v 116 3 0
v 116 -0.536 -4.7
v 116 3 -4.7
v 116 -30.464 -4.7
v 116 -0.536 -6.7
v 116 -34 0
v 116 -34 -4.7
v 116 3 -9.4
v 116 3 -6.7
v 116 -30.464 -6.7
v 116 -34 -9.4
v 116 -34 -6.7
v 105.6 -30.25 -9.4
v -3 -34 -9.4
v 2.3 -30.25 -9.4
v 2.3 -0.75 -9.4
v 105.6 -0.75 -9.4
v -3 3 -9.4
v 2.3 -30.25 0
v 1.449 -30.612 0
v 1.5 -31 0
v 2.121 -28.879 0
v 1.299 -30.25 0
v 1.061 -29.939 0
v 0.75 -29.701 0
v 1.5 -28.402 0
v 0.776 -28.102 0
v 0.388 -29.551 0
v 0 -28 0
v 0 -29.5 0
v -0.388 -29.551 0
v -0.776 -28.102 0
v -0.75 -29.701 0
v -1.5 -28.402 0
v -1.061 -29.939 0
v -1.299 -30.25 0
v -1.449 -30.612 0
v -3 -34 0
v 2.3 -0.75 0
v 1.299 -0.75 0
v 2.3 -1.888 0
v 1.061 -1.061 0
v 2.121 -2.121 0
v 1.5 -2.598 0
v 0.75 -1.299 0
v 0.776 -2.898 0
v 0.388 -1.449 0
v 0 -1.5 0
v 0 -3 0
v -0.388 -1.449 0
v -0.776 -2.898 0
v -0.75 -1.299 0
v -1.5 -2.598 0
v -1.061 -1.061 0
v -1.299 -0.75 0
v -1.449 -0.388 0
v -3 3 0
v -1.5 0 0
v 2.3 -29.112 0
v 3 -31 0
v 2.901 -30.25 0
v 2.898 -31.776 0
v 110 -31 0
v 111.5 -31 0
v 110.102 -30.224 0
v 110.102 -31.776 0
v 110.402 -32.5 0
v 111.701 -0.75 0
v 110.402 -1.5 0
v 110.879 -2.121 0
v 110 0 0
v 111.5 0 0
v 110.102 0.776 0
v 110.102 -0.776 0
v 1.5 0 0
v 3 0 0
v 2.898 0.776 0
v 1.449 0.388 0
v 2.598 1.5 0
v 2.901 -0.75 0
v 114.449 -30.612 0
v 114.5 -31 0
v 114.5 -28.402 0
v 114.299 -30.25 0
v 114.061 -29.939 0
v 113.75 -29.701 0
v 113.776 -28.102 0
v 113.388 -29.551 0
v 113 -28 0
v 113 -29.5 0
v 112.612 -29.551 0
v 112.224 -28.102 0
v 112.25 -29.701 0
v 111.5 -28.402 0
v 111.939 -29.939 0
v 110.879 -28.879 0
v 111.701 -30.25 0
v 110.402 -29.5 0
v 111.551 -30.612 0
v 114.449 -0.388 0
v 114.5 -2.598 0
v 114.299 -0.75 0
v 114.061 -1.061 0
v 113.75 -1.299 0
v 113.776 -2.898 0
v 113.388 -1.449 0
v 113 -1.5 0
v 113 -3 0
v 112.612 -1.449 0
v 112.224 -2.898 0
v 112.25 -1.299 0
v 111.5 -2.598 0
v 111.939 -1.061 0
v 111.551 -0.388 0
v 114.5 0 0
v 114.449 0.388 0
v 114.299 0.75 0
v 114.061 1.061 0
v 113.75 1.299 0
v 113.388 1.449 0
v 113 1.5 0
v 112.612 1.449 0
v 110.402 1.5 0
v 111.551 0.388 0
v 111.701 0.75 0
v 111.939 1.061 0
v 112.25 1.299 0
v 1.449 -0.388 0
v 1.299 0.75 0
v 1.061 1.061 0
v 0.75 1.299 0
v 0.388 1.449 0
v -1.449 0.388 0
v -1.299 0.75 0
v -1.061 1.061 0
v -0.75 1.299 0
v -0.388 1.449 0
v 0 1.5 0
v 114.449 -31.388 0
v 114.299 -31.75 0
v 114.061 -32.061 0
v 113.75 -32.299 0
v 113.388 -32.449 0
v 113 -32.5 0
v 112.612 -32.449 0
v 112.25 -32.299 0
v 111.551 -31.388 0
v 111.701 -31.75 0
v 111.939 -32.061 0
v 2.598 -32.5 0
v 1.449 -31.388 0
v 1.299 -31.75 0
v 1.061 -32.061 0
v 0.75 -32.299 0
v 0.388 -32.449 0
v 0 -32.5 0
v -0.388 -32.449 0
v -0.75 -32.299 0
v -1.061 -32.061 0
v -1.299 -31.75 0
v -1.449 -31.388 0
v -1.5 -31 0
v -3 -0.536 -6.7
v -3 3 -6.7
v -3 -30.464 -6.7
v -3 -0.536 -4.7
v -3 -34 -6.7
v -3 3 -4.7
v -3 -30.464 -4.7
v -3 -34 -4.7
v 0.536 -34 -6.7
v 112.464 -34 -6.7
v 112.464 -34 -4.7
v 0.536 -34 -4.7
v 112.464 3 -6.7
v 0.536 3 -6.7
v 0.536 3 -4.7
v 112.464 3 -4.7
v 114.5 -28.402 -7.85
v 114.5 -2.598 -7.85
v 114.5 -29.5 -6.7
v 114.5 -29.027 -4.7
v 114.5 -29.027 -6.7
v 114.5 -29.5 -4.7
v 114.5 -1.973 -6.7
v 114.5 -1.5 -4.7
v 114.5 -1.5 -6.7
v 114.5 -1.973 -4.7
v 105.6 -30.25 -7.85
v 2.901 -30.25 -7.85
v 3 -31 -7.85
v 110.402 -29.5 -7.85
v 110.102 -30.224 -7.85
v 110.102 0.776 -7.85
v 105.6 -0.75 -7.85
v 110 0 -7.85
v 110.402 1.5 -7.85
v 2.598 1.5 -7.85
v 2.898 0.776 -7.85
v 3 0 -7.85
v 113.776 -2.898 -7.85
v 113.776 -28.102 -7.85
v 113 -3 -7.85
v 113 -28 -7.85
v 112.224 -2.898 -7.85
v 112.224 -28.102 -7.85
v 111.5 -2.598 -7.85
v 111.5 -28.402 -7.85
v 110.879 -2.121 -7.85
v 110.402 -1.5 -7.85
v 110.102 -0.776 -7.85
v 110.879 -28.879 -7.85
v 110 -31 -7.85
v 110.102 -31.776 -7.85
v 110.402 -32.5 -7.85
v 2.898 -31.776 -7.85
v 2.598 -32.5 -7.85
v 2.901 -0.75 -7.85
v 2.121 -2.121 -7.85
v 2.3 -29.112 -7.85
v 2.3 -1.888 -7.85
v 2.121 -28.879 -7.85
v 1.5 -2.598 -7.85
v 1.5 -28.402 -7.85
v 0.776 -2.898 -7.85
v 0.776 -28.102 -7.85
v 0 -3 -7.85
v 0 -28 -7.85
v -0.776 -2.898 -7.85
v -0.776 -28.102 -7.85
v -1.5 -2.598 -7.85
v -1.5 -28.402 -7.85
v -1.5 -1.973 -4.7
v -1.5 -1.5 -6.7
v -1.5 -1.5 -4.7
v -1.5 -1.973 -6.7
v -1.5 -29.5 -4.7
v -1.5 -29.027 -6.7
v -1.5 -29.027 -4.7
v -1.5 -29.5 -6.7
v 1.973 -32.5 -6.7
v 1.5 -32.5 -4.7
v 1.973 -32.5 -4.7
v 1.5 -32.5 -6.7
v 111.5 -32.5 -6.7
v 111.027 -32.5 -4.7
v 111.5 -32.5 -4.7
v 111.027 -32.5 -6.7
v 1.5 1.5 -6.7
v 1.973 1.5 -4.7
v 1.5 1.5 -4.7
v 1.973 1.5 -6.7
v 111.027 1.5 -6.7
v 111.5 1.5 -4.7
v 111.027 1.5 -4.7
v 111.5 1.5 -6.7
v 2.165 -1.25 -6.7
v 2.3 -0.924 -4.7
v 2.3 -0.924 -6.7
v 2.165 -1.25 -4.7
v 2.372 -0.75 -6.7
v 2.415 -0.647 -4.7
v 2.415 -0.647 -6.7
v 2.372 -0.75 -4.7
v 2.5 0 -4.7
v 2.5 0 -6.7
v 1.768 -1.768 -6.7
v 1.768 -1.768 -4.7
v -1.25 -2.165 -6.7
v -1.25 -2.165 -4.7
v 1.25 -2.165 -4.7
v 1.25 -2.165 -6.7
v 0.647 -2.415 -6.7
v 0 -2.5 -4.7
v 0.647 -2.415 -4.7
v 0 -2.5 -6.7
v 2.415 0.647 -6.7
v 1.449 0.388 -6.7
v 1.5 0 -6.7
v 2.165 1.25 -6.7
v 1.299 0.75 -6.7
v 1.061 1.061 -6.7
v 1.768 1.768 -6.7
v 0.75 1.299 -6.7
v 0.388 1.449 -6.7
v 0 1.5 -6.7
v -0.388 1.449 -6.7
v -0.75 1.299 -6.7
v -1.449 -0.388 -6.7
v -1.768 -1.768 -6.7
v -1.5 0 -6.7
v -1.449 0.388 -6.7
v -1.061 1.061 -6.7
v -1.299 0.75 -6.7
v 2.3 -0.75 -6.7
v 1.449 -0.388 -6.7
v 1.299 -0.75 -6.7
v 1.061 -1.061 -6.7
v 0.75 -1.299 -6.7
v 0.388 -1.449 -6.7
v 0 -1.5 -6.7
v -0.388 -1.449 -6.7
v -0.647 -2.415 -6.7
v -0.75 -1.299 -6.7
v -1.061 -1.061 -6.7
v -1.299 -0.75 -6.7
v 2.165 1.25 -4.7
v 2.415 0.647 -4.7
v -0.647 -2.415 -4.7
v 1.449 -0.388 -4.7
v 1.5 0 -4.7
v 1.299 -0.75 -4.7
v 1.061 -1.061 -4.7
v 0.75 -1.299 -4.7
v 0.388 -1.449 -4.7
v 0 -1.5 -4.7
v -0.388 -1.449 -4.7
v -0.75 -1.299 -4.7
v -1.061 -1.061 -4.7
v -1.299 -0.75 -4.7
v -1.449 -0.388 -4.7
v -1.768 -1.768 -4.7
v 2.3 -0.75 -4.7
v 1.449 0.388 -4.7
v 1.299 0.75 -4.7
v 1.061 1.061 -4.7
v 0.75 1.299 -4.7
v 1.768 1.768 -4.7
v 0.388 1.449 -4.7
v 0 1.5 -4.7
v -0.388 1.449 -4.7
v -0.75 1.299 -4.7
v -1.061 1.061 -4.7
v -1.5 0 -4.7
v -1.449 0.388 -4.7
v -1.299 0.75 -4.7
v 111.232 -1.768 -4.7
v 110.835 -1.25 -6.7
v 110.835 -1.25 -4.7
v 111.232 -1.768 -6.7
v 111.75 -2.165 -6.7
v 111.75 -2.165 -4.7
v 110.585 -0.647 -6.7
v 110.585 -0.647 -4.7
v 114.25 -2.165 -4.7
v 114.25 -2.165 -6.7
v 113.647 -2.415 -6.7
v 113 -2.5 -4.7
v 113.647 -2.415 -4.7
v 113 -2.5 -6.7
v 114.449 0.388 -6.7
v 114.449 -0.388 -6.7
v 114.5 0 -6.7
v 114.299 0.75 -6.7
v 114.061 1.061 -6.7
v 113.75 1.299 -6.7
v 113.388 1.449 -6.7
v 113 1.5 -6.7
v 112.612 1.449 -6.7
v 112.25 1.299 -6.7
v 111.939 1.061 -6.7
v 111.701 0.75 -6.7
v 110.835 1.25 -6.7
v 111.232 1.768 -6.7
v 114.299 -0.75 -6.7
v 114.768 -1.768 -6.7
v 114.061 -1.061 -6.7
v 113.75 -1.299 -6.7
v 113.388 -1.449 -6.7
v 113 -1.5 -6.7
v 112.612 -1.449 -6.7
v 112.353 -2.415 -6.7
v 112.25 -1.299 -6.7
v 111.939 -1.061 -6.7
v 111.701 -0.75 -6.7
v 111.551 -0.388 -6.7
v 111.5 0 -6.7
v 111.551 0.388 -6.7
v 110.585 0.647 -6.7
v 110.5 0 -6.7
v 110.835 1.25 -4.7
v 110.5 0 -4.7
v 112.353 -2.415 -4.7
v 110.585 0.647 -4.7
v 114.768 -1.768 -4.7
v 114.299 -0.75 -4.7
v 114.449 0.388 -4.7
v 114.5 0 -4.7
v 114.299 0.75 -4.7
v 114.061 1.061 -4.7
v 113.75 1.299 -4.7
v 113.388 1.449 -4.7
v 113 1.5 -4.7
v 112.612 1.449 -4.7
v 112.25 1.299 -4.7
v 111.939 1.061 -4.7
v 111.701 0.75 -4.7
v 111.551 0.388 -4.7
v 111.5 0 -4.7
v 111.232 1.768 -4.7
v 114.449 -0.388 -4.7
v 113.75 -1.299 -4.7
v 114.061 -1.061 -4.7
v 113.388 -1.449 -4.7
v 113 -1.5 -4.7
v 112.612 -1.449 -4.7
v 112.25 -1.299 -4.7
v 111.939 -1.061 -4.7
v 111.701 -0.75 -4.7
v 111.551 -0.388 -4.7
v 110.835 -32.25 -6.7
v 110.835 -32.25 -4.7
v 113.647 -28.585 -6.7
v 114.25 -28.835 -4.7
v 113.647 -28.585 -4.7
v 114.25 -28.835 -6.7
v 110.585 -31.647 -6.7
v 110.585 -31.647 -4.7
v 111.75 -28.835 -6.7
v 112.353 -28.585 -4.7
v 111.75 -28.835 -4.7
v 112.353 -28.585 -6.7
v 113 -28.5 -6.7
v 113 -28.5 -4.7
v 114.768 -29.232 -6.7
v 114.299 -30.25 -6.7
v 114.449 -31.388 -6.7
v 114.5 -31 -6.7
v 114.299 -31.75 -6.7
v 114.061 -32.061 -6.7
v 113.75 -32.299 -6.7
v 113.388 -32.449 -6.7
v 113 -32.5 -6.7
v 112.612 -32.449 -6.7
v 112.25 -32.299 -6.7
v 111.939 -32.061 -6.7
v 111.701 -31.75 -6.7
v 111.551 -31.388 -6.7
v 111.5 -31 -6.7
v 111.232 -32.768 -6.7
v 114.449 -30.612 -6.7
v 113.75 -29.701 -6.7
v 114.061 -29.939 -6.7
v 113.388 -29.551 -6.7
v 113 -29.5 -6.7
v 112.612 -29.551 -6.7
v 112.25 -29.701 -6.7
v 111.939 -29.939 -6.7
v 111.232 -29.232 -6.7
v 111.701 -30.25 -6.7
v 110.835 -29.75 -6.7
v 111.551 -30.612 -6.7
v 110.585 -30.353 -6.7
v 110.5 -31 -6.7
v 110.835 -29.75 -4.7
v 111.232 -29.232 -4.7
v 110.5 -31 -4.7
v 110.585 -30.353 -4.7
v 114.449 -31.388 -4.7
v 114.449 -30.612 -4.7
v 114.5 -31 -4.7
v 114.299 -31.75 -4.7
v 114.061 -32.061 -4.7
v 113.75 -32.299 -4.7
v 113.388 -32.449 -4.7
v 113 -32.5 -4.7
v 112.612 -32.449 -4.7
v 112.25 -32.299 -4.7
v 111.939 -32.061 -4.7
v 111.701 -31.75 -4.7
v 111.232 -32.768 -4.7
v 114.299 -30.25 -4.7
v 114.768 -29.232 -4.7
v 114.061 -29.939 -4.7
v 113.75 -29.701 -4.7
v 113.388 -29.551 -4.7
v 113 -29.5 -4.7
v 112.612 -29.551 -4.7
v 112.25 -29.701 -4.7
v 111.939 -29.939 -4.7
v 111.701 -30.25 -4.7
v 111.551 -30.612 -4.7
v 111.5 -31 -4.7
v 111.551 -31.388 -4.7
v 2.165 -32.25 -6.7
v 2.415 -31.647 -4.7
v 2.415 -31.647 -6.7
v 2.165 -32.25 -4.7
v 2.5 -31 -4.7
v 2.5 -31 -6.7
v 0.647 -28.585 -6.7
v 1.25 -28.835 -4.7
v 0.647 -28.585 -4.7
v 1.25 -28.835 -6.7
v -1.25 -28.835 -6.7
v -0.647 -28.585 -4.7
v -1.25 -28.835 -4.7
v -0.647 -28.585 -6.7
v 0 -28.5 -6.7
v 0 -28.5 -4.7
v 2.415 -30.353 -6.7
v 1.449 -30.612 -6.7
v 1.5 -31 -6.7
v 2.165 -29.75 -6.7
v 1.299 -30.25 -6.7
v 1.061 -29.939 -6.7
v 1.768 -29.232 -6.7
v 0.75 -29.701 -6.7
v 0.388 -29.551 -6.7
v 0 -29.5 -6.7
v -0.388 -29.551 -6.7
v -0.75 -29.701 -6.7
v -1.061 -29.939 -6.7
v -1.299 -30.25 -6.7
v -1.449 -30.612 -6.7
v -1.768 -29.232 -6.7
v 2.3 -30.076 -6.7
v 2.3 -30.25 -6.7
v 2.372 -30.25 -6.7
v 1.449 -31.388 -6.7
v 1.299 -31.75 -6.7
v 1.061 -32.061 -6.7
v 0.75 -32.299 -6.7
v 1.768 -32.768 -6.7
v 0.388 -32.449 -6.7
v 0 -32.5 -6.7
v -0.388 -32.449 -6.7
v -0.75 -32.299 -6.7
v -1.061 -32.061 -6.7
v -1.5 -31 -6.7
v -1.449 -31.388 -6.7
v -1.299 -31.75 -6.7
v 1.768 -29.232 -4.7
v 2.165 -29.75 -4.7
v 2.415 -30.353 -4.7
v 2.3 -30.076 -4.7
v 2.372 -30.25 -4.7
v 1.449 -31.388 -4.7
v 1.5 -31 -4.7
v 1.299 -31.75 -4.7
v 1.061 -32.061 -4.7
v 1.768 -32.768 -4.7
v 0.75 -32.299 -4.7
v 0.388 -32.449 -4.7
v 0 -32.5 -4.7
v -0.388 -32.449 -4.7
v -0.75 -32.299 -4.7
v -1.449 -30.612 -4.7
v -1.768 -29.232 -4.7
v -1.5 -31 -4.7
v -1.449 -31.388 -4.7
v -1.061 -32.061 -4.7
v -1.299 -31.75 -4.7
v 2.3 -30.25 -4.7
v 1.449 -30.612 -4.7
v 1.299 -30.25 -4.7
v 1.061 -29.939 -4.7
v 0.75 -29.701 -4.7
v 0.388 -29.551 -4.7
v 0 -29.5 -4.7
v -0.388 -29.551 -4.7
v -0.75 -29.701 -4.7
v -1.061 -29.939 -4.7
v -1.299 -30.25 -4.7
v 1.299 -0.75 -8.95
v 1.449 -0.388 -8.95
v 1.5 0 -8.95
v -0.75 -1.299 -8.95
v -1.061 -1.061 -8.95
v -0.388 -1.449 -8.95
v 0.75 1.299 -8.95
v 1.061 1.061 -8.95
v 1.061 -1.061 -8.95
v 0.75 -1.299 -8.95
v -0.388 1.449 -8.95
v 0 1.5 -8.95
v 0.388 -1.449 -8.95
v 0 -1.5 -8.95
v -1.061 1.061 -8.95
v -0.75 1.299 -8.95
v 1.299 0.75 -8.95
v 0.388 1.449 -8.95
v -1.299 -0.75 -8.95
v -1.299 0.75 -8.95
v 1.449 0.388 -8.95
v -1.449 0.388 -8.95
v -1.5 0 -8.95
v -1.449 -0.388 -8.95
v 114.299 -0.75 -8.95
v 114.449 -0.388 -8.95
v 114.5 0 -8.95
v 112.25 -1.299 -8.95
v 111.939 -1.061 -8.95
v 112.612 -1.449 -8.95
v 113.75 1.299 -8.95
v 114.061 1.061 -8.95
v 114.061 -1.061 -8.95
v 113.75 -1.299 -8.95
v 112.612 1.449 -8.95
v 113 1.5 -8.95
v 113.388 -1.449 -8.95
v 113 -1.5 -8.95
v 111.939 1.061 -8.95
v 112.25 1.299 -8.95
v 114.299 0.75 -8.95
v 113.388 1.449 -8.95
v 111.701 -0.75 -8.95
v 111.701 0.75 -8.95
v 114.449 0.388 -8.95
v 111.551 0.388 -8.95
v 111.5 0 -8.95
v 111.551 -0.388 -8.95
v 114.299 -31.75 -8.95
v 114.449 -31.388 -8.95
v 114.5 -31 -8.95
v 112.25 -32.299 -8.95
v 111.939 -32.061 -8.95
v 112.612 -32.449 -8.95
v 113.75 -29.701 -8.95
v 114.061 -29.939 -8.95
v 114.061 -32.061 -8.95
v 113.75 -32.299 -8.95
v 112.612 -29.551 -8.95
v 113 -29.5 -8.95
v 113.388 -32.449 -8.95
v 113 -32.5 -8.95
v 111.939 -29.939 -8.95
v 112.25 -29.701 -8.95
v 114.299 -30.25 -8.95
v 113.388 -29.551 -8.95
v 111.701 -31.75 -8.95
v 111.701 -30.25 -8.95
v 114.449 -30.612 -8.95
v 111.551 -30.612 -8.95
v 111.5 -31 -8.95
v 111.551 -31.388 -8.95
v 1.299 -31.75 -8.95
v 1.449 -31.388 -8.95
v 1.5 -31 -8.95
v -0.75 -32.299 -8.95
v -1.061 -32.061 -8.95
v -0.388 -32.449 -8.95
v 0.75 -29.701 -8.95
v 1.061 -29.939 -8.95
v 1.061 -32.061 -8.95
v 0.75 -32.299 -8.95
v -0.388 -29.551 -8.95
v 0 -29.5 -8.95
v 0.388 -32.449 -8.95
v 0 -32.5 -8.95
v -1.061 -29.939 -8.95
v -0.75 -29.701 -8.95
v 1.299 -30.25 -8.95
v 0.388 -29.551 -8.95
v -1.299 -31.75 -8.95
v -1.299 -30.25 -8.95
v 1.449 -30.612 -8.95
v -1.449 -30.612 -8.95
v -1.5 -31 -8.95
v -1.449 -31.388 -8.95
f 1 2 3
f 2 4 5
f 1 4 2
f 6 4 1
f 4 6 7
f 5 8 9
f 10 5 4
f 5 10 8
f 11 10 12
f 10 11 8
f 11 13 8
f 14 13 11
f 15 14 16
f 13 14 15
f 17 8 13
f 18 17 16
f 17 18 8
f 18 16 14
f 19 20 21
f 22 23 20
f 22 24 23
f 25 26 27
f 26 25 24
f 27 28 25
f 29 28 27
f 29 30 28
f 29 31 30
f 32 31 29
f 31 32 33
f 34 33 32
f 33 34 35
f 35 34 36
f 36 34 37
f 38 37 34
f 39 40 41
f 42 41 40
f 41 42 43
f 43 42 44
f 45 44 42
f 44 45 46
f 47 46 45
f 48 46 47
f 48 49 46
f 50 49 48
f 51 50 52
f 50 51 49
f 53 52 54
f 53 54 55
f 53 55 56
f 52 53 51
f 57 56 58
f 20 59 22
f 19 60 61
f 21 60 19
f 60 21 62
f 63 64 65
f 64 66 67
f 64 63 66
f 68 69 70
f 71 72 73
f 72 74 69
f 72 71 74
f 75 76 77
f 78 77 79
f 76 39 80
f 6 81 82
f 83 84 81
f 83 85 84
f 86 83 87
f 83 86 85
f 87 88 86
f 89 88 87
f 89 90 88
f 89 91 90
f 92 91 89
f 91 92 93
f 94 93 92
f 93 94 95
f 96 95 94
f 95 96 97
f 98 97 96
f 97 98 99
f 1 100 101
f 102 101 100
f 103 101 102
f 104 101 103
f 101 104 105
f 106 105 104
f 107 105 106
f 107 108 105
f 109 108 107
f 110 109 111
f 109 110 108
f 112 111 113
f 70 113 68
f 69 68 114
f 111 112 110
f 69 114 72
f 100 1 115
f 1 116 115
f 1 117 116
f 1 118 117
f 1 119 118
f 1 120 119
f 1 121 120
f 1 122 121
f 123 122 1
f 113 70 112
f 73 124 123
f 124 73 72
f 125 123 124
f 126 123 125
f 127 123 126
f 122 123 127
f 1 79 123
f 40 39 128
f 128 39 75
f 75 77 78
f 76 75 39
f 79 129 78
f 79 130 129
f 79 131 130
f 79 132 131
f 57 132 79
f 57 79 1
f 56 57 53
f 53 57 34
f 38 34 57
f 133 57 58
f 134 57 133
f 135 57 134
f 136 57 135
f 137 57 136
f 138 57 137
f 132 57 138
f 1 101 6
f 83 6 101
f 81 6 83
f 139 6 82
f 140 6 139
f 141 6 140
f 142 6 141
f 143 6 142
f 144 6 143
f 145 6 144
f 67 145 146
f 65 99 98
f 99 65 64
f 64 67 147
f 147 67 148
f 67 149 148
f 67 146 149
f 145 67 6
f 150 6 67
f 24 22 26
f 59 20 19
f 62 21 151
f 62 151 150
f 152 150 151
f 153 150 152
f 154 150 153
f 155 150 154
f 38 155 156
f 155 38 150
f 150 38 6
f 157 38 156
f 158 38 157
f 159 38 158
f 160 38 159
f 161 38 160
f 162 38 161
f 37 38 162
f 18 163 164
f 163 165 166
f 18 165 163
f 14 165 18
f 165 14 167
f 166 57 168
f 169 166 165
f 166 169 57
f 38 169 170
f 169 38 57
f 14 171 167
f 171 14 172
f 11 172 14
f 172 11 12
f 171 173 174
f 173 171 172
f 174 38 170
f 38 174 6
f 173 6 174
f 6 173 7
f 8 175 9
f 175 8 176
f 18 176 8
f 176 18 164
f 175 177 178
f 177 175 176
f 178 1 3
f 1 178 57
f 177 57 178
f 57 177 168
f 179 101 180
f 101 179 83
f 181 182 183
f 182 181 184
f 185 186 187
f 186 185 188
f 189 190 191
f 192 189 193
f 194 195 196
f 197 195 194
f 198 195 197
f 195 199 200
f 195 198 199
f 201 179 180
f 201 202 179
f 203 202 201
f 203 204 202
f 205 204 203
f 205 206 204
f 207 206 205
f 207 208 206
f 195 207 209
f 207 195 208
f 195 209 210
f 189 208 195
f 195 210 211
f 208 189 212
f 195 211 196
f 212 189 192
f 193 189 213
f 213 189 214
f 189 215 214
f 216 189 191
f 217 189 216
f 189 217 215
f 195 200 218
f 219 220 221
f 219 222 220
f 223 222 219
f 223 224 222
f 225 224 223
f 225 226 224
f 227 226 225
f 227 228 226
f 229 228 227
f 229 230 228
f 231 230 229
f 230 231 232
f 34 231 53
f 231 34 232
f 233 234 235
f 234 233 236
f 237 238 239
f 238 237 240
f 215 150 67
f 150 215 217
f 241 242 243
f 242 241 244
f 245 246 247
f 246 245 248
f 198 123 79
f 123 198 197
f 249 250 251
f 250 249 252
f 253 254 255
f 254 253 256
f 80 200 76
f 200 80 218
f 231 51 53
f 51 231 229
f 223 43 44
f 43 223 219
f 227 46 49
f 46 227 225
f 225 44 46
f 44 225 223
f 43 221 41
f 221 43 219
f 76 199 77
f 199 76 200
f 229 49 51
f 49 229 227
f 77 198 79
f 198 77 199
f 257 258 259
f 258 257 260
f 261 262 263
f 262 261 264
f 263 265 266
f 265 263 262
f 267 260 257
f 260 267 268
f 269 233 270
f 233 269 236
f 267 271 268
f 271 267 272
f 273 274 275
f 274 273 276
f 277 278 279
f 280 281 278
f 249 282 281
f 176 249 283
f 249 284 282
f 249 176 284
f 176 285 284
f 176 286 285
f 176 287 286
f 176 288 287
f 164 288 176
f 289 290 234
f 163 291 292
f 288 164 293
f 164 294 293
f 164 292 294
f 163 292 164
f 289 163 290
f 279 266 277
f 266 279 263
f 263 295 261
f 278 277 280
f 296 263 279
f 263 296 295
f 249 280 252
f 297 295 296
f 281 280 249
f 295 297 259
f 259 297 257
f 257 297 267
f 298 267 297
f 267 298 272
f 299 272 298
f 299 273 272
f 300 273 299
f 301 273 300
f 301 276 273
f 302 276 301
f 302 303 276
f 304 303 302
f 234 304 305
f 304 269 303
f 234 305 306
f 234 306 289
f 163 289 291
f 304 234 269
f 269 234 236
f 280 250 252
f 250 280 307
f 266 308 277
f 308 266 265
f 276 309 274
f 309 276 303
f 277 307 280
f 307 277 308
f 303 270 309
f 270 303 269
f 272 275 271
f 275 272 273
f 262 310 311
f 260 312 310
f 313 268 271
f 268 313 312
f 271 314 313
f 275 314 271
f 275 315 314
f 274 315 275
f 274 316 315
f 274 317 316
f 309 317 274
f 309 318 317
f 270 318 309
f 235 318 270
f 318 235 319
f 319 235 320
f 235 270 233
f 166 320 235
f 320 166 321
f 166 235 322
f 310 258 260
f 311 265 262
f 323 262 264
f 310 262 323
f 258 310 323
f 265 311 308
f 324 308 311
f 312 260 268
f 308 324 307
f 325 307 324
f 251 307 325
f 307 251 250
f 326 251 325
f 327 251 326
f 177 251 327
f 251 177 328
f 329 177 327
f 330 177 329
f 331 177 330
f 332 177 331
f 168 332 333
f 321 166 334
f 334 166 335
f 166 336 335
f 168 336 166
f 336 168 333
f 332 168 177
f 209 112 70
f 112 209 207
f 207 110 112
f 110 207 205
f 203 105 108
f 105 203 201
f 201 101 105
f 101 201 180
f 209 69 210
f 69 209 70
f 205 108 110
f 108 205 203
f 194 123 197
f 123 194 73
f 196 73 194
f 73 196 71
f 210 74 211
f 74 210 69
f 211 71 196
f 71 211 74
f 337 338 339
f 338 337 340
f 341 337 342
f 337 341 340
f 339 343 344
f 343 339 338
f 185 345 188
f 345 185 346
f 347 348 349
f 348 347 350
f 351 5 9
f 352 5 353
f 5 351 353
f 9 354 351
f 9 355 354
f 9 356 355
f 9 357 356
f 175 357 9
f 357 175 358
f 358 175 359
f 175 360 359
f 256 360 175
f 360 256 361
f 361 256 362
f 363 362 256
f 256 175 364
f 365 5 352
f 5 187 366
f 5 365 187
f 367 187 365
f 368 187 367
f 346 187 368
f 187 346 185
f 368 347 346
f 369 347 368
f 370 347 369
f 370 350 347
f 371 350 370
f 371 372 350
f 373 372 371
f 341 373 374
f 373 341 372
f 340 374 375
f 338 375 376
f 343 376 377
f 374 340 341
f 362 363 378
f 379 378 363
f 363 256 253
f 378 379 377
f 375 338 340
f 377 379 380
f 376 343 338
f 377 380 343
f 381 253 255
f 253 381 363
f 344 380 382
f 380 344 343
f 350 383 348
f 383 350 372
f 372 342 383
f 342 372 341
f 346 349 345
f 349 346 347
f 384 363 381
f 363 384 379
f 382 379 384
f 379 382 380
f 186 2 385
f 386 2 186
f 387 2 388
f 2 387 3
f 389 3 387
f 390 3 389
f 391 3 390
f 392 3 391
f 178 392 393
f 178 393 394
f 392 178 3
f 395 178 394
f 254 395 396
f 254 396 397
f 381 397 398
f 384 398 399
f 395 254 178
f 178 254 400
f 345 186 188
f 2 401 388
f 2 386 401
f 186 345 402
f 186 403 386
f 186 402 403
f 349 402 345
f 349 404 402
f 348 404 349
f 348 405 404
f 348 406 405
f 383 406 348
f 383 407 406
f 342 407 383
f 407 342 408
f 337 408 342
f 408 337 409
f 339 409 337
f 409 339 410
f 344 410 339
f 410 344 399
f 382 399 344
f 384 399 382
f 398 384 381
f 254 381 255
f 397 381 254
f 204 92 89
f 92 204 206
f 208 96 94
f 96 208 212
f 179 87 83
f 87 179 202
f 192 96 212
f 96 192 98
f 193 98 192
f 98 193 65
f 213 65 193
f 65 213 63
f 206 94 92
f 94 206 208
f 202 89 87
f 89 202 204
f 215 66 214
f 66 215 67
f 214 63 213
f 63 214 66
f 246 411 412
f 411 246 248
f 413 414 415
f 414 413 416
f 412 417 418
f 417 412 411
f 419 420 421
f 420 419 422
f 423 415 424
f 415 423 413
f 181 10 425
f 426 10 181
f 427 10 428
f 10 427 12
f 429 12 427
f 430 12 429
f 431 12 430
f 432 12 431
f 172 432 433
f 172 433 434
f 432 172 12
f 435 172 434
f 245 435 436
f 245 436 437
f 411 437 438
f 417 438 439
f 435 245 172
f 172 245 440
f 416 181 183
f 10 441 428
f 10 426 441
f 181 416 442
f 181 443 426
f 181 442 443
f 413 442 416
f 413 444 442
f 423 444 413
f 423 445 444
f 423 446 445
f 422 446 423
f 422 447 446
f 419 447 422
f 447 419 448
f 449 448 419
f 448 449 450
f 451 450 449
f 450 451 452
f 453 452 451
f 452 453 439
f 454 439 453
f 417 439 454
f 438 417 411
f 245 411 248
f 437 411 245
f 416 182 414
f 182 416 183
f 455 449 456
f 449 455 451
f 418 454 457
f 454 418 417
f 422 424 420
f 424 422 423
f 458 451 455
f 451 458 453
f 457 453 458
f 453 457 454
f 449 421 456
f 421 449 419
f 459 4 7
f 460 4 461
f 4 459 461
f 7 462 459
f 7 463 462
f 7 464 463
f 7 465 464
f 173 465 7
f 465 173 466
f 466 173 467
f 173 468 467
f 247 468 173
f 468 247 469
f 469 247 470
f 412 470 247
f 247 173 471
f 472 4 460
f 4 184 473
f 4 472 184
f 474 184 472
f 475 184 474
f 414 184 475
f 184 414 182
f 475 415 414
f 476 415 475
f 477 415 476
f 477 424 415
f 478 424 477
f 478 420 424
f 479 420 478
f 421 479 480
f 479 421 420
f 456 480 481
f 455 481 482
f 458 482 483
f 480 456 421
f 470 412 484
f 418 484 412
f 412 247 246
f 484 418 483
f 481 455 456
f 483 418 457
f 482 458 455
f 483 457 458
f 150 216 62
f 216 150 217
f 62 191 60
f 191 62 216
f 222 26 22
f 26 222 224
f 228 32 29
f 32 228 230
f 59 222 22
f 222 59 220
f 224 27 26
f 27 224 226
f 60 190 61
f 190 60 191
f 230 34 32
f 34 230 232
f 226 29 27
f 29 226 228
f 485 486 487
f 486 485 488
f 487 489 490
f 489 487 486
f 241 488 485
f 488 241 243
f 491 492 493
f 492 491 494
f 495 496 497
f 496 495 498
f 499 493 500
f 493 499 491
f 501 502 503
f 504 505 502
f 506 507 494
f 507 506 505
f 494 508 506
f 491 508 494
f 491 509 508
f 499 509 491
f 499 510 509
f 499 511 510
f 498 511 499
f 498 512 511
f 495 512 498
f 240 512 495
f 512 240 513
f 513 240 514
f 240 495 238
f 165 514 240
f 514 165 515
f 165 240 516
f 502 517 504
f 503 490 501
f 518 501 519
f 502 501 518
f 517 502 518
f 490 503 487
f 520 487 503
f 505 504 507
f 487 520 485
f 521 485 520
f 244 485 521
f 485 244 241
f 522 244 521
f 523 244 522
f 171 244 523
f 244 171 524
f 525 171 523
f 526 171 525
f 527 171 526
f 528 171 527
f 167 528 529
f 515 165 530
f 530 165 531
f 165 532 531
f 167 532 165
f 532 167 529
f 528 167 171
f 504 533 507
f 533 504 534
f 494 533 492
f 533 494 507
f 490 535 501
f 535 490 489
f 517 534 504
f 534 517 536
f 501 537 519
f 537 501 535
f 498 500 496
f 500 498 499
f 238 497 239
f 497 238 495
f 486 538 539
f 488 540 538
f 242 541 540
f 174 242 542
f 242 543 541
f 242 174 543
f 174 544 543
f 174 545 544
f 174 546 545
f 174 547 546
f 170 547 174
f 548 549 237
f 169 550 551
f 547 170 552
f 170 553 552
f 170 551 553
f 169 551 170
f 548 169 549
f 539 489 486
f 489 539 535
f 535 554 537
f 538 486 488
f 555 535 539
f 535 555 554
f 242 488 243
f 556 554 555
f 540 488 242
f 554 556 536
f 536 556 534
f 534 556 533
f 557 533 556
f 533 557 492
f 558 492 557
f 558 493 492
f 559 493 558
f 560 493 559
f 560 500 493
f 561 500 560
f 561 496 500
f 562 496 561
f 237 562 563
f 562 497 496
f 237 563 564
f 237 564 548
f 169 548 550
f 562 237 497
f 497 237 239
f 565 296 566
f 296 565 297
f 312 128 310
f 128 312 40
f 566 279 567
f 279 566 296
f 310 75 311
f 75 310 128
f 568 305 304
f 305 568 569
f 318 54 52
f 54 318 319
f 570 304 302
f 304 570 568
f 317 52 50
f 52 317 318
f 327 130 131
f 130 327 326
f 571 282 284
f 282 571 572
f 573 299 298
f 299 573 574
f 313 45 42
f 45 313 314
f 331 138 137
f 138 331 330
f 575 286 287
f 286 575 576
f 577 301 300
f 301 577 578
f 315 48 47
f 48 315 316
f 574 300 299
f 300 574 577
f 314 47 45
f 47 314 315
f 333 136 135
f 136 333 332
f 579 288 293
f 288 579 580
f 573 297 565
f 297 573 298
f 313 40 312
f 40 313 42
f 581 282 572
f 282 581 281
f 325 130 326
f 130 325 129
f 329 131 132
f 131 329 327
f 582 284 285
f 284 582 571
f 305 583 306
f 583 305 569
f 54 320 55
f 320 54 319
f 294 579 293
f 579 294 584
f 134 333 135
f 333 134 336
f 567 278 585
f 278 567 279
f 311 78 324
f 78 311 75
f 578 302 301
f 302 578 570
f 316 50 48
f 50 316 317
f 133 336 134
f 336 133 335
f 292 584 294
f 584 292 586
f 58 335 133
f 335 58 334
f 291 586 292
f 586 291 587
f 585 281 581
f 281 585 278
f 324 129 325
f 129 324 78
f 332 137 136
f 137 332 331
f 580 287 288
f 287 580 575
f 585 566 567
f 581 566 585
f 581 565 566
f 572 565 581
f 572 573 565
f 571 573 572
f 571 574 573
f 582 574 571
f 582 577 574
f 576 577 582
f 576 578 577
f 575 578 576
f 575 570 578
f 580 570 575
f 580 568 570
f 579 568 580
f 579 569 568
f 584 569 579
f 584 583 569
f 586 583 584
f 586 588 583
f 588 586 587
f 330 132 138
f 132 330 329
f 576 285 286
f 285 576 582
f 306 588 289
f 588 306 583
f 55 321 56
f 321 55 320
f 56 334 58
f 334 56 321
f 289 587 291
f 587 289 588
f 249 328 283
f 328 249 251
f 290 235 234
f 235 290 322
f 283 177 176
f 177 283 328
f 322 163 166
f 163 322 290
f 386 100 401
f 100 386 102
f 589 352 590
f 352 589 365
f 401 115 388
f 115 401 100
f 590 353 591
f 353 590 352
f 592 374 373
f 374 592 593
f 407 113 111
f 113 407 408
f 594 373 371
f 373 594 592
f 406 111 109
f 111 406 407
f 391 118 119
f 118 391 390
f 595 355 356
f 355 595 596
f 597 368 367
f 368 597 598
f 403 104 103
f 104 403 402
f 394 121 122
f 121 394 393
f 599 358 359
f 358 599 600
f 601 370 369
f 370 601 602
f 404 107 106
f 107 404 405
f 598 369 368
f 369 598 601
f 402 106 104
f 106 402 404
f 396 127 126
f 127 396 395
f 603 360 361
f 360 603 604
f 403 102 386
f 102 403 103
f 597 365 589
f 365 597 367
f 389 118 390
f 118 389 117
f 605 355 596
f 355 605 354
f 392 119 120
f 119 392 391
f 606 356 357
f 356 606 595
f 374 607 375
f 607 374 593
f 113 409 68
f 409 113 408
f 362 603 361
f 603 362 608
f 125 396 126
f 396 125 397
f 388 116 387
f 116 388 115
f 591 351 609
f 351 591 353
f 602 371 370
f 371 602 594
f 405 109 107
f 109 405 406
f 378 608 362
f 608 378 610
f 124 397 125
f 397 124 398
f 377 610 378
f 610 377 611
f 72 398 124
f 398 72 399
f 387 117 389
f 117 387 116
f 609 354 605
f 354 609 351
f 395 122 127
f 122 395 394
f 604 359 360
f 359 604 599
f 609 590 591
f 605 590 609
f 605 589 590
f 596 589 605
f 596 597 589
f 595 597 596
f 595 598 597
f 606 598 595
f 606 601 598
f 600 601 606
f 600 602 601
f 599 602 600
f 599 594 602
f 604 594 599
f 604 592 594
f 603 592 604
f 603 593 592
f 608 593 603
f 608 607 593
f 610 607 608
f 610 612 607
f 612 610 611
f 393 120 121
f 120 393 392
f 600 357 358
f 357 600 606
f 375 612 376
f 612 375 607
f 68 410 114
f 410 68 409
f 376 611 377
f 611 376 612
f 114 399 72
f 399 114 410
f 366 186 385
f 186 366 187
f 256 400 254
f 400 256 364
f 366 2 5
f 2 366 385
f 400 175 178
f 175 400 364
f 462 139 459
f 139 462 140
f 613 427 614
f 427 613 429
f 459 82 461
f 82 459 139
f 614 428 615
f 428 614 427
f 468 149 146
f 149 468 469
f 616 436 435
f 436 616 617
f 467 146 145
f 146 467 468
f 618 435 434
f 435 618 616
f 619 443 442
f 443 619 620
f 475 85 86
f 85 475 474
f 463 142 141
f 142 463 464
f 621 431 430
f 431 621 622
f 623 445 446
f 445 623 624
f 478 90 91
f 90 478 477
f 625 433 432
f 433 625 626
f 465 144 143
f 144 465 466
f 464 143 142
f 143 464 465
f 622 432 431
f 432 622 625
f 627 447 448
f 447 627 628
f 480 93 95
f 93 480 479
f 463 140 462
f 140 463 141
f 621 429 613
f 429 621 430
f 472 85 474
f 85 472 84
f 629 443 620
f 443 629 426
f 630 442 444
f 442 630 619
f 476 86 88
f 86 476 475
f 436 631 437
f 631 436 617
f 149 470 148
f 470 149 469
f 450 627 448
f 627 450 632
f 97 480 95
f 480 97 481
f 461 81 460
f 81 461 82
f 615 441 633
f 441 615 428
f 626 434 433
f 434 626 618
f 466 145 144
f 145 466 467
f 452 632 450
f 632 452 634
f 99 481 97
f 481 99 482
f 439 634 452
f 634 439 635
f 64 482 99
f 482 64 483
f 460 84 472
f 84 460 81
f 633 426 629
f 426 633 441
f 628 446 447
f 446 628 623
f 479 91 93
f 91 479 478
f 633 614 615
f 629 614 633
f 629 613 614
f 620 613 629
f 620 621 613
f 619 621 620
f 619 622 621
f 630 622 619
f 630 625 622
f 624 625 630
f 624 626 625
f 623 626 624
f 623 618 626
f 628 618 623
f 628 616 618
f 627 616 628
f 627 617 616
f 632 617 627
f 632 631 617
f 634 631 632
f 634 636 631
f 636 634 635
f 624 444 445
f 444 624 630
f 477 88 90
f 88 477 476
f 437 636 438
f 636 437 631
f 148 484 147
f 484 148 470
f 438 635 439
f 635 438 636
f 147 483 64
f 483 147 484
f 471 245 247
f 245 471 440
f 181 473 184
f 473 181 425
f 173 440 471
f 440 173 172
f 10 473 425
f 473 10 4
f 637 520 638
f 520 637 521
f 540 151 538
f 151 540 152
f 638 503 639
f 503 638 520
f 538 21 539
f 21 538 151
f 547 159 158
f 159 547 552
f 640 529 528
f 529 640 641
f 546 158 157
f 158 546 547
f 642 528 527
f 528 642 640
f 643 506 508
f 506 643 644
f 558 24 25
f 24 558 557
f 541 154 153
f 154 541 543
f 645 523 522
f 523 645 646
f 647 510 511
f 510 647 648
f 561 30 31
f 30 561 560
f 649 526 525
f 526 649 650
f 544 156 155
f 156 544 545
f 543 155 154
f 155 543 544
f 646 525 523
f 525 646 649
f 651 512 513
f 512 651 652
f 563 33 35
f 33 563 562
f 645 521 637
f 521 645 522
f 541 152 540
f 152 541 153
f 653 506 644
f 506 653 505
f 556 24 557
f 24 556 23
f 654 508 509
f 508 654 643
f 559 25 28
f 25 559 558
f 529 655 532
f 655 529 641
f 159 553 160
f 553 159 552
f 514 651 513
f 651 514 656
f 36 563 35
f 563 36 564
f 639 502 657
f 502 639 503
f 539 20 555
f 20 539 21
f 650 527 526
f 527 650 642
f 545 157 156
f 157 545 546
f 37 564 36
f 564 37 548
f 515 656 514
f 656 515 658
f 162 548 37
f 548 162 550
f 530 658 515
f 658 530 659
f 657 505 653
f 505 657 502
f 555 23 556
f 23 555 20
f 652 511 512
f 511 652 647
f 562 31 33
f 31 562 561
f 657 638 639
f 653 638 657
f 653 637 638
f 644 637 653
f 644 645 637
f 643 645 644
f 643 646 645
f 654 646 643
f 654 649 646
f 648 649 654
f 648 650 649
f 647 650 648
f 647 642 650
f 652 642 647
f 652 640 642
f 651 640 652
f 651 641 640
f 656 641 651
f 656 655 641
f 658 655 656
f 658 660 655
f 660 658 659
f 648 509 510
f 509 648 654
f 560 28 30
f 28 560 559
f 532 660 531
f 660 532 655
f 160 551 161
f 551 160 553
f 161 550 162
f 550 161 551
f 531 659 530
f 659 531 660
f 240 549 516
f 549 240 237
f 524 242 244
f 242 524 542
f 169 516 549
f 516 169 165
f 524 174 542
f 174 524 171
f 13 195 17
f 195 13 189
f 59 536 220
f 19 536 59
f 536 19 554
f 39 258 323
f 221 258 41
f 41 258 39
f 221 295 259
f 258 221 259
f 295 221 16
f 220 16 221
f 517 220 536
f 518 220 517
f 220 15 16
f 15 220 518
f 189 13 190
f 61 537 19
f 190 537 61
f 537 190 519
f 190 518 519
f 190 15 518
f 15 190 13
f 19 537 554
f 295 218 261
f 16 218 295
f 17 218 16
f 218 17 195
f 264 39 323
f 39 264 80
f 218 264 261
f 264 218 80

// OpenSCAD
$fn=24;
epsilon=0.05;
clearance=0.3;

drill_x = 113;
drill_y = 31;

border=1.5;
drill_dia=3;
stud_dia=2*drill_dia;
nut_thick=2;        // The nut we slide in sideways
nut_dia=5;
bolt_top_flap=0.4;  // flap thickness covering up screw.

lcd_w=103 + clearance;
lcd_h=29.2 + clearance;
lcd_t=9.4;  // thickness
lcd_dx=2.3;
lcd_dy=(drill_y - lcd_h)/2;

module lcd() {
    translate([lcd_dx, lcd_dy, -epsilon]) {
	cube([lcd_w, lcd_h, lcd_t]);
	translate([0, 0, lcd_t-epsilon]) cube([lcd_w, lcd_h, 2]);
    }
}

module block() {
    translate([-stud_dia/2,-stud_dia/2,0]) {
	difference() {
	    cube([drill_x+stud_dia, drill_y+stud_dia, lcd_t]);
	    translate([border,border,-epsilon]) cube([drill_x+stud_dia-2*border, drill_y+stud_dia-2*border, lcd_t-border]);
	}
    }
    board_studs();
}

module bolt() {
    translate([0,0,lcd_t/2]) cylinder(r=nut_dia/2, h=nut_thick);
}

// Stud around drill.
module drill_stud() {
    difference() {
	cylinder(r=stud_dia/2, h=lcd_t);
	bolt();
    }
}

// The actual drill. Applied at the end.
module drill(angle=0) {
    translate([0,0,-epsilon]) cylinder(r=drill_dia/2, h=lcd_t - bolt_top_flap);
    // A slot to slide in the 
    rotate([0,0,angle]) translate([0,-nut_dia/2,lcd_t/2]) cube([2*stud_dia,nut_dia,nut_thick]);
}

module board_studs() {
    translate([0, 0]) drill_stud();
    translate([drill_x, 0]) drill_stud();
    translate([drill_x, drill_y]) drill_stud();
    translate([0, drill_y]) drill_stud();
}

module board_drill() {
    translate([0, 0]) drill(225);
    translate([drill_x, 0]) drill(315);
    translate([drill_x, drill_y]) drill(45);
    translate([0, drill_y]) drill(135);
}

module display_holder() {
    difference() {
	block();
	board_drill();
	lcd();
    }
}

rotate([180,0,0]) display_holder();
//display_holder();
